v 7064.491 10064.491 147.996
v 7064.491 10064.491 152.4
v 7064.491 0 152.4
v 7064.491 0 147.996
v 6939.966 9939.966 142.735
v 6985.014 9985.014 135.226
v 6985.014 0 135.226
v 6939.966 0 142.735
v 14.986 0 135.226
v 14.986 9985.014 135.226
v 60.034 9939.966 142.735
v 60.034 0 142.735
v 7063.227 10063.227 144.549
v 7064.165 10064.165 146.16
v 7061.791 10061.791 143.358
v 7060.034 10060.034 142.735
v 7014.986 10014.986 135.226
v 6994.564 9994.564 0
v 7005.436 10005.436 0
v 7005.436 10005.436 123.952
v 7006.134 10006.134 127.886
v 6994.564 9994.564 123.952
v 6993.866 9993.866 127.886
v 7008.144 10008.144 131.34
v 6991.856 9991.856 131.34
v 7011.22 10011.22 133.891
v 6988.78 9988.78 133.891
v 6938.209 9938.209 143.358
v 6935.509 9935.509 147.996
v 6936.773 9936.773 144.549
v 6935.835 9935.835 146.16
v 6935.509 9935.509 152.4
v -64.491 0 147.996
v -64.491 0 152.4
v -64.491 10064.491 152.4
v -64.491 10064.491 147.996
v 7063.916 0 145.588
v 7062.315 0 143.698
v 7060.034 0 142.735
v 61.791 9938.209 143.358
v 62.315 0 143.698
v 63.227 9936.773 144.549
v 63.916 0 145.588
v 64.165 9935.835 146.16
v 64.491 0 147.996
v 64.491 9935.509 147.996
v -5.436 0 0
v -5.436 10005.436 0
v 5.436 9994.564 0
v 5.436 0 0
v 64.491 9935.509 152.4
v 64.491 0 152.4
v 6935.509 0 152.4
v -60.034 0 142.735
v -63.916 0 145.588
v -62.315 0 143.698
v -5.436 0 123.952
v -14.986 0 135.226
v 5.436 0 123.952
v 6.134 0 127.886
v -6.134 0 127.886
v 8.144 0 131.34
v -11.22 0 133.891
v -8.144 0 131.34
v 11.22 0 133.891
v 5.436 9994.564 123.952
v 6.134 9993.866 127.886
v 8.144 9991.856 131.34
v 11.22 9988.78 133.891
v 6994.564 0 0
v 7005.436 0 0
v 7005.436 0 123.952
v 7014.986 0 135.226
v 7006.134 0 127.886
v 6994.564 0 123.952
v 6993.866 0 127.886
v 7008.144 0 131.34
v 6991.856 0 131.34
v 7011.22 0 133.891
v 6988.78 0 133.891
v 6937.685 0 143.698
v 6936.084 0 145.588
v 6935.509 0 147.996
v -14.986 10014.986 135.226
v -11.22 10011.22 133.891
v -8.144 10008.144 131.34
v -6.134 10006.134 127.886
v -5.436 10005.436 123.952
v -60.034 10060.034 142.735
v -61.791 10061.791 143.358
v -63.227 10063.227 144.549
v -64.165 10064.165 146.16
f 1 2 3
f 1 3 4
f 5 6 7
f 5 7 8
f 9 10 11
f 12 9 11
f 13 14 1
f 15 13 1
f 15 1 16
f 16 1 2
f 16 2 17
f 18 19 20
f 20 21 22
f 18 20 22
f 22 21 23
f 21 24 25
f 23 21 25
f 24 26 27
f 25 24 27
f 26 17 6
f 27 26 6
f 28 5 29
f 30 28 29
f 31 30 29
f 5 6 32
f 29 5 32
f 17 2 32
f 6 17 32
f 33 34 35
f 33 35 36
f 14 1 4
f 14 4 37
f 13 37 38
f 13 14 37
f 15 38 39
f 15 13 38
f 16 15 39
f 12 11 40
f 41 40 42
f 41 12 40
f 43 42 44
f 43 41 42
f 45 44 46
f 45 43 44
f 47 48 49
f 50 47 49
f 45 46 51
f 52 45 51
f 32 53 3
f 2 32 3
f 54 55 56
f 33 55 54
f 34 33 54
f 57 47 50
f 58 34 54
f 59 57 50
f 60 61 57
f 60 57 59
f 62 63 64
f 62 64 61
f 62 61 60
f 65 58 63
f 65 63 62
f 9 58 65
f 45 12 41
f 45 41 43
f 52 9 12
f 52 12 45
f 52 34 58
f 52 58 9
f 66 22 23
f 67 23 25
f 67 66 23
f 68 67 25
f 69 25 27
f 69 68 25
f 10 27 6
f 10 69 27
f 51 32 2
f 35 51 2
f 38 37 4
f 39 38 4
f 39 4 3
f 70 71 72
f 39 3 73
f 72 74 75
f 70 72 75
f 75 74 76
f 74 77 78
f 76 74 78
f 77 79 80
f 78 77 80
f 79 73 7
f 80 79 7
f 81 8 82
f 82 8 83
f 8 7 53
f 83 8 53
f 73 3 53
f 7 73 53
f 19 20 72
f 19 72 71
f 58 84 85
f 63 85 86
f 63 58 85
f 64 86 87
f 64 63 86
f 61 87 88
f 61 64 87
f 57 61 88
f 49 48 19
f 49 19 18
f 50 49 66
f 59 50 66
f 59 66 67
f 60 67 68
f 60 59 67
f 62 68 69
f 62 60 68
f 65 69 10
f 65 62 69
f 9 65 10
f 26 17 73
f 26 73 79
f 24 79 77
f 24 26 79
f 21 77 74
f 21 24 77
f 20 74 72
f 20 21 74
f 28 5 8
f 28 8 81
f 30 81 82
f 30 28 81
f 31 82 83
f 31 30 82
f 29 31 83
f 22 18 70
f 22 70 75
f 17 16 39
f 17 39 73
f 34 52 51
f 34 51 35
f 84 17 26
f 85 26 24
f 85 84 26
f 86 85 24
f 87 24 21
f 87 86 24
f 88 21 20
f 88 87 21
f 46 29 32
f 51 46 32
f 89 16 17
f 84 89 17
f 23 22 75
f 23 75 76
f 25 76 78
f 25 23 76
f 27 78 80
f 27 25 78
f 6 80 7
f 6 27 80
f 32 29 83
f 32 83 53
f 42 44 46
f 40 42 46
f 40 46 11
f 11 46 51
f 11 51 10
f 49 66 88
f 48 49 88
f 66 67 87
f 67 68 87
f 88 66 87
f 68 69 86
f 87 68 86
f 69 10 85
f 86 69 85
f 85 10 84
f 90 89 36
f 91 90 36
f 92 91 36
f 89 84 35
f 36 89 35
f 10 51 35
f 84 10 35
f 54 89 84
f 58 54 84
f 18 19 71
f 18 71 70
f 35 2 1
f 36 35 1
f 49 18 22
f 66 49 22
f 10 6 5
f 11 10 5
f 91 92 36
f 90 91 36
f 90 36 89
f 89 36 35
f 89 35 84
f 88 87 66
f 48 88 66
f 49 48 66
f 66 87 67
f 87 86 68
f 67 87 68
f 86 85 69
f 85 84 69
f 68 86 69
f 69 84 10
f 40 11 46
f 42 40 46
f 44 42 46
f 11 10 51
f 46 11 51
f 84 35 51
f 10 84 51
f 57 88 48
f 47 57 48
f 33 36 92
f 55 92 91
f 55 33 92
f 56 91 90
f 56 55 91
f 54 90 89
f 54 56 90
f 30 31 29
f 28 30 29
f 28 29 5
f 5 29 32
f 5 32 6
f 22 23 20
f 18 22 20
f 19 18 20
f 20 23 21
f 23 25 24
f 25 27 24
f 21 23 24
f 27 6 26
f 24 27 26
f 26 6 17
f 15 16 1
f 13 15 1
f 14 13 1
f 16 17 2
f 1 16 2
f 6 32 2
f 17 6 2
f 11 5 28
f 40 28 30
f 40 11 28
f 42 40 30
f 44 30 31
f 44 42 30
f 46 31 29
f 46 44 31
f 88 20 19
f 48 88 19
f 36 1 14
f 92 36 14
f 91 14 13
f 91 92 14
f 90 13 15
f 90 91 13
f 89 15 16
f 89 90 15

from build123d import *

# Parameters (mm, degrees)
ST_SECTION_ST6X17_5_1_DEPTH   = 10166.483526335
ST_SECTION_ST6X17_5_1_2_DEPTH = 7332.967052671
ST_SECTION_ST6X17_5_1_3_DEPTH = 10166.483526336


with BuildPart() as part:
    # Sketch11 → St section ST6X17.5(1) (new body)
    with BuildSketch(Plane(origin=(0, 0, 0), x_dir=(-1, 0, 0), z_dir=(0, 1, 0))):
        with BuildLine():
            Line((-64.4906, 152.4), (64.4906, 152.4))
            Line((64.4906, 152.4), (64.4906, 147.996286207))
            ThreePointArc((64.4906, 147.996286207), (63.226568979, 144.548546584), (60.033566439, 142.734871391))
            Line((60.033566439, 142.734871391), (14.986386201, 135.22646032))
            ThreePointArc((14.986386201, 135.22646032), (8.144237901, 131.340013477), (5.4356, 123.952))
            Line((5.4356, 123.952), (5.4356, 0))
            Line((5.4356, 0), (-5.4356, 0))
            Line((-5.4356, 0), (-5.4356, 123.952))
            ThreePointArc((-5.4356, 123.952), (-8.144237901, 131.340013477), (-14.986386201, 135.22646032))
            Line((-14.986386201, 135.22646032), (-60.033566439, 142.734871391))
            ThreePointArc((-60.033566439, 142.734871391), (-63.226568979, 144.548546584), (-64.4906, 147.996286207))
            Line((-64.4906, 147.996286207), (-64.4906, 152.4))
        make_face()
    extrude(amount=ST_SECTION_ST6X17_5_1_DEPTH)

    # St section ST6X17.5(1) mitre 1
    split(bisect_by=Plane(origin=(0, 10000, 0), x_dir=(0.707106781, -0.707106781, 0), z_dir=(-0.707106781, -0.707106781, 0)), keep=Keep.TOP)


with BuildPart() as body_2:
    # Sketch11 on segment 2 (carried to segment 2) → St section ST6X17.5_1 2 (new body)
    with BuildSketch(Plane(origin=(-166.483526335, 10000, 0), x_dir=(0, 1, 0), z_dir=(1, 0, 0))):
        with BuildLine():
            Line((-64.4906, 152.4), (64.4906, 152.4))
            Line((64.4906, 152.4), (64.4906, 147.996286207))
            ThreePointArc((64.4906, 147.996286207), (63.226568979, 144.548546584), (60.033566439, 142.734871391))
            Line((60.033566439, 142.734871391), (14.986386201, 135.22646032))
            ThreePointArc((14.986386201, 135.22646032), (8.144237901, 131.340013477), (5.4356, 123.952))
            Line((5.4356, 123.952), (5.4356, 0))
            Line((5.4356, 0), (-5.4356, 0))
            Line((-5.4356, 0), (-5.4356, 123.952))
            ThreePointArc((-5.4356, 123.952), (-8.144237901, 131.340013477), (-14.986386201, 135.22646032))
            Line((-14.986386201, 135.22646032), (-60.033566439, 142.734871391))
            ThreePointArc((-60.033566439, 142.734871391), (-63.226568979, 144.548546584), (-64.4906, 147.996286207))
            Line((-64.4906, 147.996286207), (-64.4906, 152.4))
        make_face()
    extrude(amount=ST_SECTION_ST6X17_5_1_2_DEPTH)

    # St section ST6X17.5_1 2 mitre 1
    split(bisect_by=Plane(origin=(0, 10000, 0), x_dir=(-0.707106781, 0.707106781, 0), z_dir=(0.707106781, 0.707106781, 0)), keep=Keep.TOP)

    # St section ST6X17.5_1 2 mitre 2
    split(bisect_by=Plane(origin=(7000, 10000, 0), x_dir=(-0.707106781, -0.707106781, 0), z_dir=(-0.707106781, 0.707106781, 0)), keep=Keep.TOP)


with BuildPart() as body_3:
    # Sketch11 on segment 3 (carried to segment 3) → St section ST6X17.5_1 3 (new body)
    with BuildSketch(Plane(origin=(7000, 10166.483526335, 0), x_dir=(1, 0, 0), z_dir=(0, -1, 0))):
        with BuildLine():
            Line((-64.4906, 152.4), (64.4906, 152.4))
            Line((64.4906, 152.4), (64.4906, 147.996286207))
            ThreePointArc((64.4906, 147.996286207), (63.226568979, 144.548546584), (60.033566439, 142.734871391))
            Line((60.033566439, 142.734871391), (14.986386201, 135.22646032))
            ThreePointArc((14.986386201, 135.22646032), (8.144237901, 131.340013477), (5.4356, 123.952))
            Line((5.4356, 123.952), (5.4356, 0))
            Line((5.4356, 0), (-5.4356, 0))
            Line((-5.4356, 0), (-5.4356, 123.952))
            ThreePointArc((-5.4356, 123.952), (-8.144237901, 131.340013477), (-14.986386201, 135.22646032))
            Line((-14.986386201, 135.22646032), (-60.033566439, 142.734871391))
            ThreePointArc((-60.033566439, 142.734871391), (-63.226568979, 144.548546584), (-64.4906, 147.996286207))
            Line((-64.4906, 147.996286207), (-64.4906, 152.4))
        make_face()
    extrude(amount=ST_SECTION_ST6X17_5_1_3_DEPTH)

    # St section ST6X17.5_1 3 mitre 1
    split(bisect_by=Plane(origin=(7000, 10000, 0), x_dir=(0.707106781, 0.707106781, 0), z_dir=(0.707106781, -0.707106781, 0)), keep=Keep.TOP)


solid = Compound([part.part, body_2.part, body_3.part])
